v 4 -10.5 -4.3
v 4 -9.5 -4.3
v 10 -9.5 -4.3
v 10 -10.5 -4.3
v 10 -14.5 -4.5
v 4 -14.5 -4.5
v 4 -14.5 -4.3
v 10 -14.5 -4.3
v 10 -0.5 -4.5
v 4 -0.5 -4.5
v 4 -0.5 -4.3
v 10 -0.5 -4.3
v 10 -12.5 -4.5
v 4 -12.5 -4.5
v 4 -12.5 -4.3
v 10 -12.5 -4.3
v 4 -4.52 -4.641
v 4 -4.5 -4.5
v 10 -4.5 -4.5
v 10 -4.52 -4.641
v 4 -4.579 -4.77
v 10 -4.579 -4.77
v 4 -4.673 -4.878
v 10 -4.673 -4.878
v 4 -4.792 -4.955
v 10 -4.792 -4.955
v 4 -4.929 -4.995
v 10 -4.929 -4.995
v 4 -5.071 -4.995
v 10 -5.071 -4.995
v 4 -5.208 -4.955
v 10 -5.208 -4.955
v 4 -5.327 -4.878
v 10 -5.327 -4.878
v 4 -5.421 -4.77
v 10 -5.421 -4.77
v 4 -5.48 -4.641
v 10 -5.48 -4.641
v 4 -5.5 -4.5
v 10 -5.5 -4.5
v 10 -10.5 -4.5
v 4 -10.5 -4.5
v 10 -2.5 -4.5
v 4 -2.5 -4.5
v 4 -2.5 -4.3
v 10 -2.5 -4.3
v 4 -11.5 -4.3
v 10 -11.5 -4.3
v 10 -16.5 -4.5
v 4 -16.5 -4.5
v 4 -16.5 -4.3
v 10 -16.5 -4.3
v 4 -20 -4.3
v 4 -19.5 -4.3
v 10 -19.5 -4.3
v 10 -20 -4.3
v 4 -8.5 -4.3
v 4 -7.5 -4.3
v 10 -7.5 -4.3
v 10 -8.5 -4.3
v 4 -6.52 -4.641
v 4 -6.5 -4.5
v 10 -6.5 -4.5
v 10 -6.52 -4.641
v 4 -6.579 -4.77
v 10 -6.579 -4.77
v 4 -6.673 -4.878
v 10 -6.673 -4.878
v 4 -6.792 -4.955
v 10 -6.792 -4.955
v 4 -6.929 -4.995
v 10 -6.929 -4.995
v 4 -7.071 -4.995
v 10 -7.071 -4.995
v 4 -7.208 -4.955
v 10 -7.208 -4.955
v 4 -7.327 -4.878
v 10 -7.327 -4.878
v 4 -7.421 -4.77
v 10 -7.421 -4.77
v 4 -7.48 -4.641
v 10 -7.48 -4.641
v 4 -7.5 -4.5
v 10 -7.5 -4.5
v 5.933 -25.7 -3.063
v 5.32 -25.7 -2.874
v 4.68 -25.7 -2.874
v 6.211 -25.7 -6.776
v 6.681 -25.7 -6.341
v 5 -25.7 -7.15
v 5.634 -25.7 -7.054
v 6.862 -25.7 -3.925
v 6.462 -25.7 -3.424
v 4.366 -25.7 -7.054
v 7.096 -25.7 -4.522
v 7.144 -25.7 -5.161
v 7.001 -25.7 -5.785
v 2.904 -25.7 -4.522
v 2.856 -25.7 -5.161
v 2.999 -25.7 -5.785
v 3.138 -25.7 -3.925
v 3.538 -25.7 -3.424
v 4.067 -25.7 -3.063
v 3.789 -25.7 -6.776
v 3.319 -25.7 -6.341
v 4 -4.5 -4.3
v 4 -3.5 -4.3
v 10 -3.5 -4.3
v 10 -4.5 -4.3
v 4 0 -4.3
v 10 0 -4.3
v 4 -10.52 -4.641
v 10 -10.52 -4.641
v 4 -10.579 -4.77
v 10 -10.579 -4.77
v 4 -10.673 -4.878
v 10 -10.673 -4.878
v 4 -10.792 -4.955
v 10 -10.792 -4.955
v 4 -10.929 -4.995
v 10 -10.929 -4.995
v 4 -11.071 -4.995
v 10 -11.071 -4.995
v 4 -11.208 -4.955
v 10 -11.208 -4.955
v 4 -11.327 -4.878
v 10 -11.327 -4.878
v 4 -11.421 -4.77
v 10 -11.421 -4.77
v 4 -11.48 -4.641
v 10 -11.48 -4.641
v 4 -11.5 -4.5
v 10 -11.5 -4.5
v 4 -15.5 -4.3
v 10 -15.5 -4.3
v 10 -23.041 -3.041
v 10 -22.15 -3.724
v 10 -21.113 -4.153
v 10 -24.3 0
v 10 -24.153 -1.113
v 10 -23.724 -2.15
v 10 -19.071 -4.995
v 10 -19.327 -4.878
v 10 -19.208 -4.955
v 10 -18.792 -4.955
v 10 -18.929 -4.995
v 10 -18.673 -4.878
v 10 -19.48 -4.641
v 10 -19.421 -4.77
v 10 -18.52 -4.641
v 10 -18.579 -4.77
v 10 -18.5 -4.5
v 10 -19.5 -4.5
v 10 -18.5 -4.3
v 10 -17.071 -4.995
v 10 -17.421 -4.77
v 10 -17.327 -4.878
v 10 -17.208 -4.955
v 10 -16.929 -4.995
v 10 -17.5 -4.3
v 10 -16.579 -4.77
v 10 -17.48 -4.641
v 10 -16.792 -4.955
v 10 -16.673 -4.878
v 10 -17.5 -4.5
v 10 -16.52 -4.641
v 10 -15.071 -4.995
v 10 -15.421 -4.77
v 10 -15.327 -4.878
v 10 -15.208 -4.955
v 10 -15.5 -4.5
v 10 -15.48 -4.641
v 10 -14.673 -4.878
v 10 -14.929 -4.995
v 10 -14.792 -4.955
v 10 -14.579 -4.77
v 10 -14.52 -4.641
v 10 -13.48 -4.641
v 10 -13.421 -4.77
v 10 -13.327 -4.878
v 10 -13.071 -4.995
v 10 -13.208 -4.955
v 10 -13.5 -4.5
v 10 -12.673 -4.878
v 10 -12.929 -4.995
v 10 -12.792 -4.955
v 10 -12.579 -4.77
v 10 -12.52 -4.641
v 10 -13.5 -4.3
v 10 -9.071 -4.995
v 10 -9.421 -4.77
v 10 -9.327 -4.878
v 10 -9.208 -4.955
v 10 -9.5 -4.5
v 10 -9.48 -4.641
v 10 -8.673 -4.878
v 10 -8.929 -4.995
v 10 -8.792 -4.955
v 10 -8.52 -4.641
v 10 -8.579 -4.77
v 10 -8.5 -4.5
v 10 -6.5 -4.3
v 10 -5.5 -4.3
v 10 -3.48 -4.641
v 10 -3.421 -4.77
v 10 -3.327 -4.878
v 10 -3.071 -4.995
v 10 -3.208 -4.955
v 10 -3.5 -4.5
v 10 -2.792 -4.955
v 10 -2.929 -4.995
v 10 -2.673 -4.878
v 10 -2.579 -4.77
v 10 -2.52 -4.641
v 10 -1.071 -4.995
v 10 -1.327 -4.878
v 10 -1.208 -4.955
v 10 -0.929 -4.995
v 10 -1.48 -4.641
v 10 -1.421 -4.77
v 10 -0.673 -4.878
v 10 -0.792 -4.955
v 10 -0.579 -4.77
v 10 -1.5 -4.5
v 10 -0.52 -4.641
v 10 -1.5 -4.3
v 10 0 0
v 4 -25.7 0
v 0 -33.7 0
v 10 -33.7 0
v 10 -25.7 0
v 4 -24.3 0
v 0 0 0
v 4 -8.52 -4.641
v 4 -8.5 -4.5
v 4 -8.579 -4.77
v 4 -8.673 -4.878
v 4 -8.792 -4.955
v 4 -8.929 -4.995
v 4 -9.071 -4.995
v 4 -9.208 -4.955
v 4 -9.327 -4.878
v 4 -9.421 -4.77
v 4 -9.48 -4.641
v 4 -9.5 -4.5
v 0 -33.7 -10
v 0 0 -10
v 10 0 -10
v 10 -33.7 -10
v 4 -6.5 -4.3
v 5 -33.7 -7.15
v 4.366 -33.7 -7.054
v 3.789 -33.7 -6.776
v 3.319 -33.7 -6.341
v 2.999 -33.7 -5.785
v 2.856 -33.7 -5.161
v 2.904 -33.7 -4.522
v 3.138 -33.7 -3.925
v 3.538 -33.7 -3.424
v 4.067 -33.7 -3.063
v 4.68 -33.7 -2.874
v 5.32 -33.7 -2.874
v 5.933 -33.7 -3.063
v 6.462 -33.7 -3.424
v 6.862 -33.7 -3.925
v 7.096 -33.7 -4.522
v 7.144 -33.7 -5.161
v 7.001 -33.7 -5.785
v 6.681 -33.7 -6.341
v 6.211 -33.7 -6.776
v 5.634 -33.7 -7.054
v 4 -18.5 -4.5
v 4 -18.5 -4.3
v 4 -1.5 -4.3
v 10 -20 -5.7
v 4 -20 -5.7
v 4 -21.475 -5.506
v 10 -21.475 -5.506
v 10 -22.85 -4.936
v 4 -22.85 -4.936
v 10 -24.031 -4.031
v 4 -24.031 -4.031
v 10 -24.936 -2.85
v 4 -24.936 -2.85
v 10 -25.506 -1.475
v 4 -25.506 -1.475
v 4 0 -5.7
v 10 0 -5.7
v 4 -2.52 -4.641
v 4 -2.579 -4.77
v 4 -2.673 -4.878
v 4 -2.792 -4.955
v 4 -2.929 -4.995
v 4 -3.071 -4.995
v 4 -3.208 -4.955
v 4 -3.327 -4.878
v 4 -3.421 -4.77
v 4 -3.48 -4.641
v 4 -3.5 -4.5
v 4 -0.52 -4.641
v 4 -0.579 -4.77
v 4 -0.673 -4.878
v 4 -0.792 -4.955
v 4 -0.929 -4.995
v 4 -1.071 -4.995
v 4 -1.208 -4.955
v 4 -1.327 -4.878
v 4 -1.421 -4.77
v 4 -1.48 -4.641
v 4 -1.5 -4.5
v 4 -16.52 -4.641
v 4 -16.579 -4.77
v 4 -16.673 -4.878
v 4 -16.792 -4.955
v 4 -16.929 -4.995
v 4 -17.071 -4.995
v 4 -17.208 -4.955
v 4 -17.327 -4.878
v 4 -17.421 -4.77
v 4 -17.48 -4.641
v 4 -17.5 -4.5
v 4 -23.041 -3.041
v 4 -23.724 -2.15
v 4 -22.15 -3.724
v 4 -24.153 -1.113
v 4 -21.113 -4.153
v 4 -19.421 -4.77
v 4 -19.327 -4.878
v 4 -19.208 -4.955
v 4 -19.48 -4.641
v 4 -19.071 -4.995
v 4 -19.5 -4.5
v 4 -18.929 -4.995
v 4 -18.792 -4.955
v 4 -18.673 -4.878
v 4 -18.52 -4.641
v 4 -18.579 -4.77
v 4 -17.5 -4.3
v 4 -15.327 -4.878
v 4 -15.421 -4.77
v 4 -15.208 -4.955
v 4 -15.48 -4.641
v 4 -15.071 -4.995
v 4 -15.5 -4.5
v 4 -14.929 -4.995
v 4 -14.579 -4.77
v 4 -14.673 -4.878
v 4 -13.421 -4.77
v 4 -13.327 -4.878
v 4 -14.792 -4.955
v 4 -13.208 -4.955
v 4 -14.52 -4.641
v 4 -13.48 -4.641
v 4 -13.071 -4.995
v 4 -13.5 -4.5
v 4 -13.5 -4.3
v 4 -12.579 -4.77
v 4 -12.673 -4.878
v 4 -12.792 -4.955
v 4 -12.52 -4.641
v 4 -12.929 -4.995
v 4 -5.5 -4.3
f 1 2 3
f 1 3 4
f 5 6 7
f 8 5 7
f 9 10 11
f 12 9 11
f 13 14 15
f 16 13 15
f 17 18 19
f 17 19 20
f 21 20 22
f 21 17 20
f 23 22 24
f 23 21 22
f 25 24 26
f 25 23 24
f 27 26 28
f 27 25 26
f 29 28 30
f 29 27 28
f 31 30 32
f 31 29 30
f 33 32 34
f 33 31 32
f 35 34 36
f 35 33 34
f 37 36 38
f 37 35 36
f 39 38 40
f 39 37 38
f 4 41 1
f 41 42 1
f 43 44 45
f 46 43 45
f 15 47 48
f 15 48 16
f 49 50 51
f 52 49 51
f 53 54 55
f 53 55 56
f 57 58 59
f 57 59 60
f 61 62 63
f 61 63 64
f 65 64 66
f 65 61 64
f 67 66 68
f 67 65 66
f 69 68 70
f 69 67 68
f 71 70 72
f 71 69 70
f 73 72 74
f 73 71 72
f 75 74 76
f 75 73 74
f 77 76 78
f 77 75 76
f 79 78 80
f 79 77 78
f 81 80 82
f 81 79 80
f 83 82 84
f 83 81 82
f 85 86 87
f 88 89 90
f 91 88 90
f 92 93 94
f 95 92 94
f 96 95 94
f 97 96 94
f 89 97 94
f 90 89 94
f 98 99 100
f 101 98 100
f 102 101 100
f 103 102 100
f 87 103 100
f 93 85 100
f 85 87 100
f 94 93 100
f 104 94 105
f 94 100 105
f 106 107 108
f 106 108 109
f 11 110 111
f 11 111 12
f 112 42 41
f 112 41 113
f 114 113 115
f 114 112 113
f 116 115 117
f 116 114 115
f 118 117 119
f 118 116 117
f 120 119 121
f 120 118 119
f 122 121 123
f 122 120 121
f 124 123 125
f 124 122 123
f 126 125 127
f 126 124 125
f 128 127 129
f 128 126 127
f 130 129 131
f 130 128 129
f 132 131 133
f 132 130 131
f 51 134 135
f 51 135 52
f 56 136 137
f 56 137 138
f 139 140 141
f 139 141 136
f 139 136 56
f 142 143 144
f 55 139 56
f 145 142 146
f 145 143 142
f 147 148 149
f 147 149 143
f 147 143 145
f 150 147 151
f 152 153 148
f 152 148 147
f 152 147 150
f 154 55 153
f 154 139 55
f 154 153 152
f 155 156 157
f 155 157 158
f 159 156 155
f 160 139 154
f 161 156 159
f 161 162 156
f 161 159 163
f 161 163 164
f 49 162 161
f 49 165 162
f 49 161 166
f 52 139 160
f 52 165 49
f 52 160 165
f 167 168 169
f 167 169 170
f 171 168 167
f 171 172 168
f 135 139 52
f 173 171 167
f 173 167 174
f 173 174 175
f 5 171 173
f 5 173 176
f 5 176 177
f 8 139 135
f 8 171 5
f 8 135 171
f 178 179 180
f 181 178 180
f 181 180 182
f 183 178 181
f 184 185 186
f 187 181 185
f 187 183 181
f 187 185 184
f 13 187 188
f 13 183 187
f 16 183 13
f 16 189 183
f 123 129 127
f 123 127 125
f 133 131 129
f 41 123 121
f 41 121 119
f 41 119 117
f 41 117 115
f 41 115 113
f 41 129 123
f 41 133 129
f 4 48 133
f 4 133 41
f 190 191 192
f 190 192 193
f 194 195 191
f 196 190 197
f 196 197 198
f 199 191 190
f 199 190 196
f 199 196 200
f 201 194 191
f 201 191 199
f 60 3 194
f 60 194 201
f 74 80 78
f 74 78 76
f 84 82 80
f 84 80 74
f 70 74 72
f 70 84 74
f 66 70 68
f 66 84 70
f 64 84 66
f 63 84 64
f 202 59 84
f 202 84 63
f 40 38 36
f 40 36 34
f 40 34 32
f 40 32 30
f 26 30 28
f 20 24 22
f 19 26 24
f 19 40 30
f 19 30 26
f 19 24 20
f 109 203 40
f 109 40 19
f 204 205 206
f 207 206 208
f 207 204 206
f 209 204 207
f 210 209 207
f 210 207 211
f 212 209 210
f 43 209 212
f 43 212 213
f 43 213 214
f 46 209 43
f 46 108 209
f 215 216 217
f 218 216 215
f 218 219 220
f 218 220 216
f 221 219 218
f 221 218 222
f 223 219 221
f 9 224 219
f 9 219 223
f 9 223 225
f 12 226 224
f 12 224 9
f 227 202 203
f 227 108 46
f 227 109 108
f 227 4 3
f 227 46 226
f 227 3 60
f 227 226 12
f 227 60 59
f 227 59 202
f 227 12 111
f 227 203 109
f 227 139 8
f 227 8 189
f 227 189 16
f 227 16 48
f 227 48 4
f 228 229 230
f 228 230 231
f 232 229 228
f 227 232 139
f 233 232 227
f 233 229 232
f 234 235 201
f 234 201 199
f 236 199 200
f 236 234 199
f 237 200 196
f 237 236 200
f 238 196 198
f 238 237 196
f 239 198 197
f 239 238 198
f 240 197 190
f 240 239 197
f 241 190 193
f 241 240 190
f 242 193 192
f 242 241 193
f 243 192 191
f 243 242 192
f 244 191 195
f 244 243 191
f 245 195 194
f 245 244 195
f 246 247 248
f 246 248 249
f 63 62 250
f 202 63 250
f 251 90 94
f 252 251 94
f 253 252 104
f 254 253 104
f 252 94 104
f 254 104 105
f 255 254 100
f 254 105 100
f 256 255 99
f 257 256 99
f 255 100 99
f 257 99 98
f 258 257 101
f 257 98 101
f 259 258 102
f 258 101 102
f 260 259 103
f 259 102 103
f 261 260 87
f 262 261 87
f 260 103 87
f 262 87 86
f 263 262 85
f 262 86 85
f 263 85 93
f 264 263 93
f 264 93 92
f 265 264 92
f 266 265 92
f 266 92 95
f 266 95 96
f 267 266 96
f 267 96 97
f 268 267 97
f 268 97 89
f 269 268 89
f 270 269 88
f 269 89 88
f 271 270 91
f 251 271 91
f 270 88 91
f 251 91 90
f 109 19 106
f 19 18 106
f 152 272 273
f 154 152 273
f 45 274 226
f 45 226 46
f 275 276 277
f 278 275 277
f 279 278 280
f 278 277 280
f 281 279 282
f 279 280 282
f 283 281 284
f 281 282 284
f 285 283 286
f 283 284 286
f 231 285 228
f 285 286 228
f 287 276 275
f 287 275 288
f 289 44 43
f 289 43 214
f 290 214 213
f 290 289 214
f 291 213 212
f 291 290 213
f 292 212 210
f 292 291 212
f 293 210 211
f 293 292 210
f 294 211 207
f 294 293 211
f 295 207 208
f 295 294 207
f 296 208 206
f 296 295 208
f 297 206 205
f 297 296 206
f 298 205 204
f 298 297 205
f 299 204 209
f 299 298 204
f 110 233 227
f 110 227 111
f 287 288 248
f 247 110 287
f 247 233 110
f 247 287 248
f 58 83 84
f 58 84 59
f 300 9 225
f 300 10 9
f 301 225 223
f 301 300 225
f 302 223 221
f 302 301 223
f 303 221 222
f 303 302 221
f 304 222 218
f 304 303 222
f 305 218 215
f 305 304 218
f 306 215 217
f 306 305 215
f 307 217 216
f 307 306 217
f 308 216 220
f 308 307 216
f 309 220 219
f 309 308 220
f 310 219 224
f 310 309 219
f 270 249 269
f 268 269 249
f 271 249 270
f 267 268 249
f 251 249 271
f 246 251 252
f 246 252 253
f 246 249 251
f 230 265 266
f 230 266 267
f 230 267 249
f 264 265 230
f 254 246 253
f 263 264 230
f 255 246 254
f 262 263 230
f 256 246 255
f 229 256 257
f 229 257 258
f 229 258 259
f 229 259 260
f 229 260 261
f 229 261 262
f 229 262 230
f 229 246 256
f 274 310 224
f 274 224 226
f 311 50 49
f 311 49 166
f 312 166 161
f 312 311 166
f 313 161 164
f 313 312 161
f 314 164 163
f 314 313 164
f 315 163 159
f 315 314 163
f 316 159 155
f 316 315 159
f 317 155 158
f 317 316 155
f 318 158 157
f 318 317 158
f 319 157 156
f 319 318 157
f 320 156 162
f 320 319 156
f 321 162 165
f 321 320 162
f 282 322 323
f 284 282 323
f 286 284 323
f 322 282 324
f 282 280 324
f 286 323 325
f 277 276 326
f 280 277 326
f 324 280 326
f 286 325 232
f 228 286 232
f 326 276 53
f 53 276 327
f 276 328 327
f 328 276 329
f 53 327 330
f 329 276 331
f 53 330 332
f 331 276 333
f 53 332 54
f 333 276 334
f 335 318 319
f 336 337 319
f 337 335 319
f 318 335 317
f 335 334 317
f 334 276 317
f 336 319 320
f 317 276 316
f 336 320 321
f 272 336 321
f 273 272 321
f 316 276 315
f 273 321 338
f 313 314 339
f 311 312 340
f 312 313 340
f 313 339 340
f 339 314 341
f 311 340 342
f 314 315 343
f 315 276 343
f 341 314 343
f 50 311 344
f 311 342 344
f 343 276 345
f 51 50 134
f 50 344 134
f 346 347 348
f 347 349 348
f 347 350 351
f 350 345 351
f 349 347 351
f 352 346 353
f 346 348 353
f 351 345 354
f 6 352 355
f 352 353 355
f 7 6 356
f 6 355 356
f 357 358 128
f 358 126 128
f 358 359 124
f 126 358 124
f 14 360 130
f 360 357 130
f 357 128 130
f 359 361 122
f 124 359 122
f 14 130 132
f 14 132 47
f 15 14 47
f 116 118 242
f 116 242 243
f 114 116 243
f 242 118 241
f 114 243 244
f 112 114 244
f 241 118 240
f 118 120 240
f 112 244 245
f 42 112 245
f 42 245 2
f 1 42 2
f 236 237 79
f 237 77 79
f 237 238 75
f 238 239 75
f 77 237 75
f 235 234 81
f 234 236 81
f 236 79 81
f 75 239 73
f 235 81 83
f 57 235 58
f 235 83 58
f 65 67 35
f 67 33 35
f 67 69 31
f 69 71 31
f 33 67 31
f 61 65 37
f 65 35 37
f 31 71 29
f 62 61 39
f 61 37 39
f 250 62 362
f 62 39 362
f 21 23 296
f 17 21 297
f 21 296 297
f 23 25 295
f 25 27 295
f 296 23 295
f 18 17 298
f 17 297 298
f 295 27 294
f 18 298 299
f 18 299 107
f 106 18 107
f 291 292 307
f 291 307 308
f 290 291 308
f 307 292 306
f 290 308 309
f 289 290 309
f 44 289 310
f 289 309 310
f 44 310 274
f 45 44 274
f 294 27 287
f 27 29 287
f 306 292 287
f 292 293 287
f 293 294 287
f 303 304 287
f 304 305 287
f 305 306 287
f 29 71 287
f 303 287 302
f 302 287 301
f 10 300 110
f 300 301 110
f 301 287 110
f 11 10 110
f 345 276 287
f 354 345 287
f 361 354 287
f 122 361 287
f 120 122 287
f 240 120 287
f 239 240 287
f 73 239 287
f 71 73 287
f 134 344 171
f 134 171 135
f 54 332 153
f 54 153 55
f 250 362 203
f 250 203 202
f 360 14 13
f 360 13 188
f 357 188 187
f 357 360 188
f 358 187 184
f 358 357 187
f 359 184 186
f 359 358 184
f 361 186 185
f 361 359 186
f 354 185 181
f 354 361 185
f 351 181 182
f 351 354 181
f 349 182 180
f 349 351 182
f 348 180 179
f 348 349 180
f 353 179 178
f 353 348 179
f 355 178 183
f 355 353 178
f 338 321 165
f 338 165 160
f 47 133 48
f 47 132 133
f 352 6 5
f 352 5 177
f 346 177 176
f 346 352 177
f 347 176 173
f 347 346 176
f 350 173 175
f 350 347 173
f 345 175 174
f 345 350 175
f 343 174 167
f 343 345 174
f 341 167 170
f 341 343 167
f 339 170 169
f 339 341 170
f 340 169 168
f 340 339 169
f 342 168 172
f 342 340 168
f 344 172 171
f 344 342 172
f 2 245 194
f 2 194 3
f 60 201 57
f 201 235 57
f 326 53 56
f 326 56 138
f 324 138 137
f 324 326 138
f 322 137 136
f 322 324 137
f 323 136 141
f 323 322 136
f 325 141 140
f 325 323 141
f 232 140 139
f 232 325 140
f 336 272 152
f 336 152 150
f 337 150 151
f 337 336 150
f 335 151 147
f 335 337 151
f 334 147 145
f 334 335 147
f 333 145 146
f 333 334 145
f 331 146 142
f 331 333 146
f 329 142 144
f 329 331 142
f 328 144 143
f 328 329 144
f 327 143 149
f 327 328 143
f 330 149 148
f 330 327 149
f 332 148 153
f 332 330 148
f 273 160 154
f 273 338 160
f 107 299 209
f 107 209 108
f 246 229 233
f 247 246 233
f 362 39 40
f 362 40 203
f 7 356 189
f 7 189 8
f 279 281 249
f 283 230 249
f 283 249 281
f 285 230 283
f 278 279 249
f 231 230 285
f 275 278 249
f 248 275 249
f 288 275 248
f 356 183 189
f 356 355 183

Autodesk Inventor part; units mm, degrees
ref_plane "YZ Plane" through (0, 0, 0) normal (1, 0, 0) x (0, 1, 0)
ref_plane "XZ Plane" through (0, 0, 0) normal (0, 1, 0) x (-1, 0, 0)
ref_plane "XY Plane" through (0, 0, 0) normal (0, 0, 1) x (1, 0, 0)
sketch "Sketch1" plane through (0, 0, 0) normal (1, 0, 0) x (0, 1, 0)
  line L0 (0, 0) -> (-33.7, 0)
  line L1 (0, 0) -> (0, -4.3)
  arc A0 (-1.5, -4.5) -> (-0.5, -4.5) centre (-1, -4.5) ccw
  line L2 (-0.5, -4.5) -> (-0.5, -4.3)
  line L3 (-1.5, -4.5) -> (-1.5, -4.3)
  line L4 (0, -4.3) -> (-0.5, -4.3)
  line L5 (-1.5, -4.3) -> (-2, -4.3)
  line L6 (-2, -4.3) -> (-2.5, -4.3)
  arc A1 (-3.5, -4.5) -> (-2.5, -4.5) centre (-3, -4.5) ccw
  line L7 (-2.5, -4.5) -> (-2.5, -4.3)
  line L8 (-3.5, -4.5) -> (-3.5, -4.3)
  line L9 (-3.5, -4.3) -> (-4, -4.3)
  line L10 (-4, -4.3) -> (-4.5, -4.3)
  arc A2 (-5.5, -4.5) -> (-4.5, -4.5) centre (-5, -4.5) ccw
  line L11 (-4.5, -4.5) -> (-4.5, -4.3)
  line L12 (-5.5, -4.5) -> (-5.5, -4.3)
  line L13 (-5.5, -4.3) -> (-6, -4.3)
  line L14 (-6, -4.3) -> (-6.5, -4.3)
  arc A3 (-7.5, -4.5) -> (-6.5, -4.5) centre (-7, -4.5) ccw
  line L15 (-6.5, -4.5) -> (-6.5, -4.3)
  line L16 (-7.5, -4.5) -> (-7.5, -4.3)
  line L17 (-7.5, -4.3) -> (-8, -4.3)
  line L18 (-8, -4.3) -> (-8.5, -4.3)
  arc A4 (-9.5, -4.5) -> (-8.5, -4.5) centre (-9, -4.5) ccw
  line L19 (-8.5, -4.5) -> (-8.5, -4.3)
  line L20 (-9.5, -4.5) -> (-9.5, -4.3)
  line L21 (-9.5, -4.3) -> (-10, -4.3)
  line L22 (-10, -4.3) -> (-10.5, -4.3)
  arc A5 (-11.5, -4.5) -> (-10.5, -4.5) centre (-11, -4.5) ccw
  line L23 (-10.5, -4.5) -> (-10.5, -4.3)
  line L24 (-11.5, -4.5) -> (-11.5, -4.3)
  line L25 (-11.5, -4.3) -> (-12, -4.3)
  line L26 (-12, -4.3) -> (-12.5, -4.3)
  arc A6 (-13.5, -4.5) -> (-12.5, -4.5) centre (-13, -4.5) ccw
  line L27 (-12.5, -4.5) -> (-12.5, -4.3)
  line L28 (-13.5, -4.5) -> (-13.5, -4.3)
  line L29 (-13.5, -4.3) -> (-14, -4.3)
  line L30 (-14, -4.3) -> (-14.5, -4.3)
  arc A7 (-15.5, -4.5) -> (-14.5, -4.5) centre (-15, -4.5) ccw
  line L31 (-14.5, -4.5) -> (-14.5, -4.3)
  line L32 (-15.5, -4.5) -> (-15.5, -4.3)
  line L33 (-15.5, -4.3) -> (-16, -4.3)
  line L34 (-16, -4.3) -> (-16.5, -4.3)
  arc A8 (-17.5, -4.5) -> (-16.5, -4.5) centre (-17, -4.5) ccw
  line L35 (-16.5, -4.5) -> (-16.5, -4.3)
  line L36 (-17.5, -4.5) -> (-17.5, -4.3)
  line L37 (-17.5, -4.3) -> (-18, -4.3)
  line L38 (-18, -4.3) -> (-18.5, -4.3)
  arc A9 (-19.5, -4.5) -> (-18.5, -4.5) centre (-19, -4.5) ccw
  line L39 (-18.5, -4.5) -> (-18.5, -4.3)
  line L40 (-19.5, -4.5) -> (-19.5, -4.3)
  line L41 (-19.5, -4.3) -> (-20, -4.3)
  line L42 (-20, -5.7) -> (0, -5.7)
  line L43 (0, -5.7) -> (0, -10)
  line L44 (0, -10) -> (-33.7, -10)
  line L45 (-33.7, -10) -> (-33.7, 0)
  line L46 (-20, -5) -> (0, -5) construction
  arc A10 (-24.3, 0) -> (-20, -4.3) centre (-20, 0) ccw
  arc A11 (-25.7, 0) -> (-20, -5.7) centre (-20, 0) ccw
  dimension "d1" = 2
  dimension "d2" = 1
  dimension "d4" = 1
  dimension "d5" = 0.2
  dimension "d8" = 2
  dimension "d14" = 1.4
  dimension "d15" = 10
  dimension "d31" = 8
extrude "Extrusion1" add sketch "Sketch1" along normal blind 10
sketch "Sketch2" plane through (0, -33.7, -10) normal (0, -1, 0) x (1, 0, 0)
  line L0 (0, 10) -> (0, 0) construction
  line L1 (0, 0) -> (10, 0) construction
  line L2 (10, 10) -> (10, 0) construction
  line L3 (0, 10) -> (10, 10) construction
  line L4 (0, 0) -> (10, 0) construction
  line L5 (0, 5.7) -> (0, 10) construction
  line L6 (10, 0) -> (0, 10) construction
  line L7 (0, 10) -> (10, 10) construction
  line L8 (10, 10) -> (0, 0) construction
  line L9 (0, 5) -> (10, 5) construction
  point P0 (5, 5)
hole "Hole1" at (5, -33.7, -5) direction (0, 1, 0) diameter 4.3 depth 8
sketch "Sketch3" plane through (0, 0, 0) normal (-1, 0, 0) x (0, 0, 1)
  line L0 (-10, -33.7) -> (-10, 0) construction
  line L1 (0, 0) -> (0, -33.7) construction
  line L2 (0, -33.7) -> (-10, -33.7) projected
  line L3 (-4.3, 0) -> (0, 0) projected
  line L4 (-10, -33.7) -> (0, -33.7)
  line L5 (0, -33.7) -> (0, 0)
  line L6 (0, 0) -> (-10, 0)
  line L7 (-10, 0) -> (-10, -33.7)
  line L8 (-10, -33.7) -> (-10, 0) projected
  line L9 (0, 0) -> (0, -33.7) projected
  arc A0 (-5.7, -20) -> (0, -25.7) centre (0, -20) ccw projected
  line L10 (0, -25.7) -> (-10, -25.7)
  point P0 (-4.3, 0)
  point P1 (0, -25.7)
extrude "Extrusion2" add sketch "Sketch3" against normal blind 4 contours L10 L7 L6 L3 L5
sketch "Sketch5" plane through (0, 0, 0) normal (-1, 0, 0) x (0, 0, 1)
  line L0 (-3.5, 0) -> (0, -13.0622)
  line L1 (-6.5, 0) -> (-10, -13.0622)
  line L2 (0, 0) -> (0, -33.7) projected
  line L3 (-10, 0) -> (0, 0) projected
  line L4 (-10, -33.7) -> (-10, 0) projected
  line L5 (0, -33.7) -> (-10, -33.7) projected
  line L6 (-5, 0) -> (-5, -33.7) construction
  line L7 (0, -33.7) -> (-10, -33.7) projected
  dimension "d33" = 3
  dimension "d34" = 15
properties part number "BeltClampTensioner"
